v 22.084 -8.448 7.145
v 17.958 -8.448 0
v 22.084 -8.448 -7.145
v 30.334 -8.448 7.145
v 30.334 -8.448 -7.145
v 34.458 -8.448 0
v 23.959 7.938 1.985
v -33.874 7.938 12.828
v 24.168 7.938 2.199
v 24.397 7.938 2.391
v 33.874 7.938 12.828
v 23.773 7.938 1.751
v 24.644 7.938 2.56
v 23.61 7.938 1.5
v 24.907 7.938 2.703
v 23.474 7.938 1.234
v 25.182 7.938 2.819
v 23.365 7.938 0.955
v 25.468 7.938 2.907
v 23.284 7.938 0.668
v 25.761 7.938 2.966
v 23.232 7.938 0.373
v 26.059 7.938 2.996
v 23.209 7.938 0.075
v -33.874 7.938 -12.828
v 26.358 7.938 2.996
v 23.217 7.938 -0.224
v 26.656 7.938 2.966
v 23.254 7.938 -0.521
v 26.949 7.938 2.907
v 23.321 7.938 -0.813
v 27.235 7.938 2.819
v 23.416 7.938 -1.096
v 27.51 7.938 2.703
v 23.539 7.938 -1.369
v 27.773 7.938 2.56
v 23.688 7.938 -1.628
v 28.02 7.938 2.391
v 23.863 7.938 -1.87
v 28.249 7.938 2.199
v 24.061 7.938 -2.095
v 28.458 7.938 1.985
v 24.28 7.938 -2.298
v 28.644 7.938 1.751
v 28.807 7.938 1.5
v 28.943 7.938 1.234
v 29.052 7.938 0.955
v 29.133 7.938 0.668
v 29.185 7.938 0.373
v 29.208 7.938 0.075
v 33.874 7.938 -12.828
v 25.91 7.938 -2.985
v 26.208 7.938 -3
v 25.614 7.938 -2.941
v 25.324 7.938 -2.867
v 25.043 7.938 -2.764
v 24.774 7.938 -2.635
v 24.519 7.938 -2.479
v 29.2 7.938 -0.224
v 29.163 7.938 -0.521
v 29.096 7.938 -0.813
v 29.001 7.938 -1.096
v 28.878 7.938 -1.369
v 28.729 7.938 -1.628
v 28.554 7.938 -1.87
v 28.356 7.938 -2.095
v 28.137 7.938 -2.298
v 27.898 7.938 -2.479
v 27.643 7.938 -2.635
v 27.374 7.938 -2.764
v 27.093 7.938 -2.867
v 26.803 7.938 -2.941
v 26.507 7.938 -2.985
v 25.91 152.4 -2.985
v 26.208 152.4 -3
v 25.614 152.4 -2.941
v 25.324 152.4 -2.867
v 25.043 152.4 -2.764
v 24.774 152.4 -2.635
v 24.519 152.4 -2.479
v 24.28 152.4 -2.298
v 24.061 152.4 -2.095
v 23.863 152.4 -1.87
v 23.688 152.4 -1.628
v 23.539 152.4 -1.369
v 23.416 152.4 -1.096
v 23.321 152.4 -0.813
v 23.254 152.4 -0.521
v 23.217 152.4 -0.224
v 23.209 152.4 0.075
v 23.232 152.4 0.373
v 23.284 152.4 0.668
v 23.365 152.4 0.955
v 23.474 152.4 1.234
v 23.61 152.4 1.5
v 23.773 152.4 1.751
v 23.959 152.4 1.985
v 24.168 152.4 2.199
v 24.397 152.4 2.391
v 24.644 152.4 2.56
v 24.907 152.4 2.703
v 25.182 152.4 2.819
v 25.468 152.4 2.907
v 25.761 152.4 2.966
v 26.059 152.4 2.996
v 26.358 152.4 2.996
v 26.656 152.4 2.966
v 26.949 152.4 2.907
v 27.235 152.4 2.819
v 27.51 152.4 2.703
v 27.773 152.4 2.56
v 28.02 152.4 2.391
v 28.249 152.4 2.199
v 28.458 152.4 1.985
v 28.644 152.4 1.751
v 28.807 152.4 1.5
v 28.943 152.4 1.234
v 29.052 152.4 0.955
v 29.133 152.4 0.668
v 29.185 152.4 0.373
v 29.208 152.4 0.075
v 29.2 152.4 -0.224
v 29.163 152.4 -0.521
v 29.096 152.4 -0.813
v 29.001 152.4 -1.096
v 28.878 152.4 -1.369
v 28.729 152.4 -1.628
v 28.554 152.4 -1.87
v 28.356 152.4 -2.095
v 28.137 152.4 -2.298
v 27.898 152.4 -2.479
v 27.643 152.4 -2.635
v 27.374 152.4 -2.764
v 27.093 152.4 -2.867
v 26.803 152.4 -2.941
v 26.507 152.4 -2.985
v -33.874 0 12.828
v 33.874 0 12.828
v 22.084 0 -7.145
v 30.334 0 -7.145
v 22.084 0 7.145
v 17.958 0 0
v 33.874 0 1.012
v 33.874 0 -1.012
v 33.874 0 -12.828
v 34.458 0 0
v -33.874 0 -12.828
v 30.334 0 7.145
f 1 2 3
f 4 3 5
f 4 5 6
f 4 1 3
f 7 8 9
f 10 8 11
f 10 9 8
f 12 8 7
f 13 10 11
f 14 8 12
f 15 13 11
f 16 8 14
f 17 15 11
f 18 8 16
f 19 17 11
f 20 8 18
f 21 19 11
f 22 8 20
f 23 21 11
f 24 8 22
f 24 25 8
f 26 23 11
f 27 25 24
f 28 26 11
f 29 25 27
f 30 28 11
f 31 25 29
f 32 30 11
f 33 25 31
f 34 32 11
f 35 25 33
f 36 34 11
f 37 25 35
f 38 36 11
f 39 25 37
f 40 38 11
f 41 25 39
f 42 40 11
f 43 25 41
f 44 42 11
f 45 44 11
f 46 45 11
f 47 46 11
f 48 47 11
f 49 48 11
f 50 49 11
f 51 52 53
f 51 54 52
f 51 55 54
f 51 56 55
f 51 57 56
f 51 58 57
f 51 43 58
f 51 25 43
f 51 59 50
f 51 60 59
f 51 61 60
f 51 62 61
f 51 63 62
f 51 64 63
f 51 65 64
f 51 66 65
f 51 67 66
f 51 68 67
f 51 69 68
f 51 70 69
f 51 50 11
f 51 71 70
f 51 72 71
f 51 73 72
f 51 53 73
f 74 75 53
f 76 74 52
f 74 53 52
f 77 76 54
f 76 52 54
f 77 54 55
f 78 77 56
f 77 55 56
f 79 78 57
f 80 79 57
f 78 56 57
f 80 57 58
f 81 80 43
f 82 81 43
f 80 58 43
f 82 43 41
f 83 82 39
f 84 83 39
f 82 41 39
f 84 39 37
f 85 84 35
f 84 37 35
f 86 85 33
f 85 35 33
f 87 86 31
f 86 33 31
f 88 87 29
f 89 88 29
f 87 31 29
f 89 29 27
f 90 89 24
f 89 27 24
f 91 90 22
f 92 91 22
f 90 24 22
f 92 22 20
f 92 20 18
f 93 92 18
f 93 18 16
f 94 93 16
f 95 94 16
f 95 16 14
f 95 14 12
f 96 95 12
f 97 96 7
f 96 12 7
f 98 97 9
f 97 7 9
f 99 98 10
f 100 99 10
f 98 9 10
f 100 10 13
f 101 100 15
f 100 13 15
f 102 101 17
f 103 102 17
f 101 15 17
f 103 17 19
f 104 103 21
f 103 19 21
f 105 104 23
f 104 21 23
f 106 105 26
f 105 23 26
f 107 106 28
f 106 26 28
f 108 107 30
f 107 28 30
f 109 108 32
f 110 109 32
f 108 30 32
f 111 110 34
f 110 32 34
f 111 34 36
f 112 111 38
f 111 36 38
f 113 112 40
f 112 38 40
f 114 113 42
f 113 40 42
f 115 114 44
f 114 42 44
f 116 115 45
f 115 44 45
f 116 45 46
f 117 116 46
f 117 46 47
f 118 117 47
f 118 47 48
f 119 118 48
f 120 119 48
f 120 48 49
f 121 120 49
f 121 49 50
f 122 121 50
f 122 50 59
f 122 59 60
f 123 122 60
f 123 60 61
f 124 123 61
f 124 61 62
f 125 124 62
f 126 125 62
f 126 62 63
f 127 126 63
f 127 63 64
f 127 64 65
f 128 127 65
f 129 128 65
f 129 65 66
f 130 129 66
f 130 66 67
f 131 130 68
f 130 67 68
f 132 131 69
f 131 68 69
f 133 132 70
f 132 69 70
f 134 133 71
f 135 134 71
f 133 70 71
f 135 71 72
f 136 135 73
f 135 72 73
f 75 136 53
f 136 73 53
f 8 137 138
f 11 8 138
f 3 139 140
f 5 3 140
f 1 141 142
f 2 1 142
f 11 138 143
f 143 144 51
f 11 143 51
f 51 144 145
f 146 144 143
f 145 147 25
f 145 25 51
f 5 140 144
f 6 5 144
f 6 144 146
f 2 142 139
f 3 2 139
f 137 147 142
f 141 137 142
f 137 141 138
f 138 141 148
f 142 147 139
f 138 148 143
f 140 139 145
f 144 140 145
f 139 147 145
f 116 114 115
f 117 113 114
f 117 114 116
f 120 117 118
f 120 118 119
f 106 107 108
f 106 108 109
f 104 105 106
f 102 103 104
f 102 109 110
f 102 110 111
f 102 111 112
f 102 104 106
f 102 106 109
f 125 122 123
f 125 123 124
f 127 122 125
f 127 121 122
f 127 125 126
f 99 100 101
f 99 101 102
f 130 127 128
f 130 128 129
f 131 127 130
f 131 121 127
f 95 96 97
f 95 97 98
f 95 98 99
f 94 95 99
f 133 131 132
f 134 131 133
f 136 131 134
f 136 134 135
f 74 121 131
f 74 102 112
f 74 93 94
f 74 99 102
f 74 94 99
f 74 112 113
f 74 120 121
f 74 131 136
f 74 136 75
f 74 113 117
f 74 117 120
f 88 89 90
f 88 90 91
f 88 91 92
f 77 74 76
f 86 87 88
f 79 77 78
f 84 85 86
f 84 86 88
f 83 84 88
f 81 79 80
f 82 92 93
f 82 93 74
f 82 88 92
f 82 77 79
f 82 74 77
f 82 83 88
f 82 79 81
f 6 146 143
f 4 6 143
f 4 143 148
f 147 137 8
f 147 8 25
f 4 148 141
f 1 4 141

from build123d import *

# Parameters (mm, degrees)
SKETCH1_W           = 67.749
SKETCH1_H           = 25.656
BOSS_EXTRUDE1_DEPTH = 7.9375
SKETCH2_R           = 3
BOSS_EXTRUDE2_DEPTH = 144.4625
BOSS_EXTRUDE4_DEPTH = 8.448


with BuildPart() as part:
    # Sketch1 → Boss-Extrude1 (new body)
    with BuildSketch(Plane(origin=(0, 0, 0), x_dir=(1, 0, 0), z_dir=(0, 1, 0))):
        Rectangle(SKETCH1_W, SKETCH1_H)
    extrude(amount=BOSS_EXTRUDE1_DEPTH)

    # Sketch2 → Boss-Extrude2 (add)
    with BuildSketch(Plane(origin=(0, 7.9375, 0), x_dir=(1, 0, 0), z_dir=(0, 1, 0))):
        with Locations(Location((26.2085, 0, 0), (0, 0, 90))):
            Circle(SKETCH2_R)
    extrude(amount=BOSS_EXTRUDE2_DEPTH)

    # Sketch3 → Boss-Extrude4 (add)
    with BuildSketch(Plane.XZ):
        Polygon((22.0835, -7.144709581), (30.3335, -7.144709581), (34.4585, 0), (30.3335, 7.144709581), (22.0835, 7.144709581), (17.9585, 0), align=None)
    extrude(amount=BOSS_EXTRUDE4_DEPTH)


solid = part.part
